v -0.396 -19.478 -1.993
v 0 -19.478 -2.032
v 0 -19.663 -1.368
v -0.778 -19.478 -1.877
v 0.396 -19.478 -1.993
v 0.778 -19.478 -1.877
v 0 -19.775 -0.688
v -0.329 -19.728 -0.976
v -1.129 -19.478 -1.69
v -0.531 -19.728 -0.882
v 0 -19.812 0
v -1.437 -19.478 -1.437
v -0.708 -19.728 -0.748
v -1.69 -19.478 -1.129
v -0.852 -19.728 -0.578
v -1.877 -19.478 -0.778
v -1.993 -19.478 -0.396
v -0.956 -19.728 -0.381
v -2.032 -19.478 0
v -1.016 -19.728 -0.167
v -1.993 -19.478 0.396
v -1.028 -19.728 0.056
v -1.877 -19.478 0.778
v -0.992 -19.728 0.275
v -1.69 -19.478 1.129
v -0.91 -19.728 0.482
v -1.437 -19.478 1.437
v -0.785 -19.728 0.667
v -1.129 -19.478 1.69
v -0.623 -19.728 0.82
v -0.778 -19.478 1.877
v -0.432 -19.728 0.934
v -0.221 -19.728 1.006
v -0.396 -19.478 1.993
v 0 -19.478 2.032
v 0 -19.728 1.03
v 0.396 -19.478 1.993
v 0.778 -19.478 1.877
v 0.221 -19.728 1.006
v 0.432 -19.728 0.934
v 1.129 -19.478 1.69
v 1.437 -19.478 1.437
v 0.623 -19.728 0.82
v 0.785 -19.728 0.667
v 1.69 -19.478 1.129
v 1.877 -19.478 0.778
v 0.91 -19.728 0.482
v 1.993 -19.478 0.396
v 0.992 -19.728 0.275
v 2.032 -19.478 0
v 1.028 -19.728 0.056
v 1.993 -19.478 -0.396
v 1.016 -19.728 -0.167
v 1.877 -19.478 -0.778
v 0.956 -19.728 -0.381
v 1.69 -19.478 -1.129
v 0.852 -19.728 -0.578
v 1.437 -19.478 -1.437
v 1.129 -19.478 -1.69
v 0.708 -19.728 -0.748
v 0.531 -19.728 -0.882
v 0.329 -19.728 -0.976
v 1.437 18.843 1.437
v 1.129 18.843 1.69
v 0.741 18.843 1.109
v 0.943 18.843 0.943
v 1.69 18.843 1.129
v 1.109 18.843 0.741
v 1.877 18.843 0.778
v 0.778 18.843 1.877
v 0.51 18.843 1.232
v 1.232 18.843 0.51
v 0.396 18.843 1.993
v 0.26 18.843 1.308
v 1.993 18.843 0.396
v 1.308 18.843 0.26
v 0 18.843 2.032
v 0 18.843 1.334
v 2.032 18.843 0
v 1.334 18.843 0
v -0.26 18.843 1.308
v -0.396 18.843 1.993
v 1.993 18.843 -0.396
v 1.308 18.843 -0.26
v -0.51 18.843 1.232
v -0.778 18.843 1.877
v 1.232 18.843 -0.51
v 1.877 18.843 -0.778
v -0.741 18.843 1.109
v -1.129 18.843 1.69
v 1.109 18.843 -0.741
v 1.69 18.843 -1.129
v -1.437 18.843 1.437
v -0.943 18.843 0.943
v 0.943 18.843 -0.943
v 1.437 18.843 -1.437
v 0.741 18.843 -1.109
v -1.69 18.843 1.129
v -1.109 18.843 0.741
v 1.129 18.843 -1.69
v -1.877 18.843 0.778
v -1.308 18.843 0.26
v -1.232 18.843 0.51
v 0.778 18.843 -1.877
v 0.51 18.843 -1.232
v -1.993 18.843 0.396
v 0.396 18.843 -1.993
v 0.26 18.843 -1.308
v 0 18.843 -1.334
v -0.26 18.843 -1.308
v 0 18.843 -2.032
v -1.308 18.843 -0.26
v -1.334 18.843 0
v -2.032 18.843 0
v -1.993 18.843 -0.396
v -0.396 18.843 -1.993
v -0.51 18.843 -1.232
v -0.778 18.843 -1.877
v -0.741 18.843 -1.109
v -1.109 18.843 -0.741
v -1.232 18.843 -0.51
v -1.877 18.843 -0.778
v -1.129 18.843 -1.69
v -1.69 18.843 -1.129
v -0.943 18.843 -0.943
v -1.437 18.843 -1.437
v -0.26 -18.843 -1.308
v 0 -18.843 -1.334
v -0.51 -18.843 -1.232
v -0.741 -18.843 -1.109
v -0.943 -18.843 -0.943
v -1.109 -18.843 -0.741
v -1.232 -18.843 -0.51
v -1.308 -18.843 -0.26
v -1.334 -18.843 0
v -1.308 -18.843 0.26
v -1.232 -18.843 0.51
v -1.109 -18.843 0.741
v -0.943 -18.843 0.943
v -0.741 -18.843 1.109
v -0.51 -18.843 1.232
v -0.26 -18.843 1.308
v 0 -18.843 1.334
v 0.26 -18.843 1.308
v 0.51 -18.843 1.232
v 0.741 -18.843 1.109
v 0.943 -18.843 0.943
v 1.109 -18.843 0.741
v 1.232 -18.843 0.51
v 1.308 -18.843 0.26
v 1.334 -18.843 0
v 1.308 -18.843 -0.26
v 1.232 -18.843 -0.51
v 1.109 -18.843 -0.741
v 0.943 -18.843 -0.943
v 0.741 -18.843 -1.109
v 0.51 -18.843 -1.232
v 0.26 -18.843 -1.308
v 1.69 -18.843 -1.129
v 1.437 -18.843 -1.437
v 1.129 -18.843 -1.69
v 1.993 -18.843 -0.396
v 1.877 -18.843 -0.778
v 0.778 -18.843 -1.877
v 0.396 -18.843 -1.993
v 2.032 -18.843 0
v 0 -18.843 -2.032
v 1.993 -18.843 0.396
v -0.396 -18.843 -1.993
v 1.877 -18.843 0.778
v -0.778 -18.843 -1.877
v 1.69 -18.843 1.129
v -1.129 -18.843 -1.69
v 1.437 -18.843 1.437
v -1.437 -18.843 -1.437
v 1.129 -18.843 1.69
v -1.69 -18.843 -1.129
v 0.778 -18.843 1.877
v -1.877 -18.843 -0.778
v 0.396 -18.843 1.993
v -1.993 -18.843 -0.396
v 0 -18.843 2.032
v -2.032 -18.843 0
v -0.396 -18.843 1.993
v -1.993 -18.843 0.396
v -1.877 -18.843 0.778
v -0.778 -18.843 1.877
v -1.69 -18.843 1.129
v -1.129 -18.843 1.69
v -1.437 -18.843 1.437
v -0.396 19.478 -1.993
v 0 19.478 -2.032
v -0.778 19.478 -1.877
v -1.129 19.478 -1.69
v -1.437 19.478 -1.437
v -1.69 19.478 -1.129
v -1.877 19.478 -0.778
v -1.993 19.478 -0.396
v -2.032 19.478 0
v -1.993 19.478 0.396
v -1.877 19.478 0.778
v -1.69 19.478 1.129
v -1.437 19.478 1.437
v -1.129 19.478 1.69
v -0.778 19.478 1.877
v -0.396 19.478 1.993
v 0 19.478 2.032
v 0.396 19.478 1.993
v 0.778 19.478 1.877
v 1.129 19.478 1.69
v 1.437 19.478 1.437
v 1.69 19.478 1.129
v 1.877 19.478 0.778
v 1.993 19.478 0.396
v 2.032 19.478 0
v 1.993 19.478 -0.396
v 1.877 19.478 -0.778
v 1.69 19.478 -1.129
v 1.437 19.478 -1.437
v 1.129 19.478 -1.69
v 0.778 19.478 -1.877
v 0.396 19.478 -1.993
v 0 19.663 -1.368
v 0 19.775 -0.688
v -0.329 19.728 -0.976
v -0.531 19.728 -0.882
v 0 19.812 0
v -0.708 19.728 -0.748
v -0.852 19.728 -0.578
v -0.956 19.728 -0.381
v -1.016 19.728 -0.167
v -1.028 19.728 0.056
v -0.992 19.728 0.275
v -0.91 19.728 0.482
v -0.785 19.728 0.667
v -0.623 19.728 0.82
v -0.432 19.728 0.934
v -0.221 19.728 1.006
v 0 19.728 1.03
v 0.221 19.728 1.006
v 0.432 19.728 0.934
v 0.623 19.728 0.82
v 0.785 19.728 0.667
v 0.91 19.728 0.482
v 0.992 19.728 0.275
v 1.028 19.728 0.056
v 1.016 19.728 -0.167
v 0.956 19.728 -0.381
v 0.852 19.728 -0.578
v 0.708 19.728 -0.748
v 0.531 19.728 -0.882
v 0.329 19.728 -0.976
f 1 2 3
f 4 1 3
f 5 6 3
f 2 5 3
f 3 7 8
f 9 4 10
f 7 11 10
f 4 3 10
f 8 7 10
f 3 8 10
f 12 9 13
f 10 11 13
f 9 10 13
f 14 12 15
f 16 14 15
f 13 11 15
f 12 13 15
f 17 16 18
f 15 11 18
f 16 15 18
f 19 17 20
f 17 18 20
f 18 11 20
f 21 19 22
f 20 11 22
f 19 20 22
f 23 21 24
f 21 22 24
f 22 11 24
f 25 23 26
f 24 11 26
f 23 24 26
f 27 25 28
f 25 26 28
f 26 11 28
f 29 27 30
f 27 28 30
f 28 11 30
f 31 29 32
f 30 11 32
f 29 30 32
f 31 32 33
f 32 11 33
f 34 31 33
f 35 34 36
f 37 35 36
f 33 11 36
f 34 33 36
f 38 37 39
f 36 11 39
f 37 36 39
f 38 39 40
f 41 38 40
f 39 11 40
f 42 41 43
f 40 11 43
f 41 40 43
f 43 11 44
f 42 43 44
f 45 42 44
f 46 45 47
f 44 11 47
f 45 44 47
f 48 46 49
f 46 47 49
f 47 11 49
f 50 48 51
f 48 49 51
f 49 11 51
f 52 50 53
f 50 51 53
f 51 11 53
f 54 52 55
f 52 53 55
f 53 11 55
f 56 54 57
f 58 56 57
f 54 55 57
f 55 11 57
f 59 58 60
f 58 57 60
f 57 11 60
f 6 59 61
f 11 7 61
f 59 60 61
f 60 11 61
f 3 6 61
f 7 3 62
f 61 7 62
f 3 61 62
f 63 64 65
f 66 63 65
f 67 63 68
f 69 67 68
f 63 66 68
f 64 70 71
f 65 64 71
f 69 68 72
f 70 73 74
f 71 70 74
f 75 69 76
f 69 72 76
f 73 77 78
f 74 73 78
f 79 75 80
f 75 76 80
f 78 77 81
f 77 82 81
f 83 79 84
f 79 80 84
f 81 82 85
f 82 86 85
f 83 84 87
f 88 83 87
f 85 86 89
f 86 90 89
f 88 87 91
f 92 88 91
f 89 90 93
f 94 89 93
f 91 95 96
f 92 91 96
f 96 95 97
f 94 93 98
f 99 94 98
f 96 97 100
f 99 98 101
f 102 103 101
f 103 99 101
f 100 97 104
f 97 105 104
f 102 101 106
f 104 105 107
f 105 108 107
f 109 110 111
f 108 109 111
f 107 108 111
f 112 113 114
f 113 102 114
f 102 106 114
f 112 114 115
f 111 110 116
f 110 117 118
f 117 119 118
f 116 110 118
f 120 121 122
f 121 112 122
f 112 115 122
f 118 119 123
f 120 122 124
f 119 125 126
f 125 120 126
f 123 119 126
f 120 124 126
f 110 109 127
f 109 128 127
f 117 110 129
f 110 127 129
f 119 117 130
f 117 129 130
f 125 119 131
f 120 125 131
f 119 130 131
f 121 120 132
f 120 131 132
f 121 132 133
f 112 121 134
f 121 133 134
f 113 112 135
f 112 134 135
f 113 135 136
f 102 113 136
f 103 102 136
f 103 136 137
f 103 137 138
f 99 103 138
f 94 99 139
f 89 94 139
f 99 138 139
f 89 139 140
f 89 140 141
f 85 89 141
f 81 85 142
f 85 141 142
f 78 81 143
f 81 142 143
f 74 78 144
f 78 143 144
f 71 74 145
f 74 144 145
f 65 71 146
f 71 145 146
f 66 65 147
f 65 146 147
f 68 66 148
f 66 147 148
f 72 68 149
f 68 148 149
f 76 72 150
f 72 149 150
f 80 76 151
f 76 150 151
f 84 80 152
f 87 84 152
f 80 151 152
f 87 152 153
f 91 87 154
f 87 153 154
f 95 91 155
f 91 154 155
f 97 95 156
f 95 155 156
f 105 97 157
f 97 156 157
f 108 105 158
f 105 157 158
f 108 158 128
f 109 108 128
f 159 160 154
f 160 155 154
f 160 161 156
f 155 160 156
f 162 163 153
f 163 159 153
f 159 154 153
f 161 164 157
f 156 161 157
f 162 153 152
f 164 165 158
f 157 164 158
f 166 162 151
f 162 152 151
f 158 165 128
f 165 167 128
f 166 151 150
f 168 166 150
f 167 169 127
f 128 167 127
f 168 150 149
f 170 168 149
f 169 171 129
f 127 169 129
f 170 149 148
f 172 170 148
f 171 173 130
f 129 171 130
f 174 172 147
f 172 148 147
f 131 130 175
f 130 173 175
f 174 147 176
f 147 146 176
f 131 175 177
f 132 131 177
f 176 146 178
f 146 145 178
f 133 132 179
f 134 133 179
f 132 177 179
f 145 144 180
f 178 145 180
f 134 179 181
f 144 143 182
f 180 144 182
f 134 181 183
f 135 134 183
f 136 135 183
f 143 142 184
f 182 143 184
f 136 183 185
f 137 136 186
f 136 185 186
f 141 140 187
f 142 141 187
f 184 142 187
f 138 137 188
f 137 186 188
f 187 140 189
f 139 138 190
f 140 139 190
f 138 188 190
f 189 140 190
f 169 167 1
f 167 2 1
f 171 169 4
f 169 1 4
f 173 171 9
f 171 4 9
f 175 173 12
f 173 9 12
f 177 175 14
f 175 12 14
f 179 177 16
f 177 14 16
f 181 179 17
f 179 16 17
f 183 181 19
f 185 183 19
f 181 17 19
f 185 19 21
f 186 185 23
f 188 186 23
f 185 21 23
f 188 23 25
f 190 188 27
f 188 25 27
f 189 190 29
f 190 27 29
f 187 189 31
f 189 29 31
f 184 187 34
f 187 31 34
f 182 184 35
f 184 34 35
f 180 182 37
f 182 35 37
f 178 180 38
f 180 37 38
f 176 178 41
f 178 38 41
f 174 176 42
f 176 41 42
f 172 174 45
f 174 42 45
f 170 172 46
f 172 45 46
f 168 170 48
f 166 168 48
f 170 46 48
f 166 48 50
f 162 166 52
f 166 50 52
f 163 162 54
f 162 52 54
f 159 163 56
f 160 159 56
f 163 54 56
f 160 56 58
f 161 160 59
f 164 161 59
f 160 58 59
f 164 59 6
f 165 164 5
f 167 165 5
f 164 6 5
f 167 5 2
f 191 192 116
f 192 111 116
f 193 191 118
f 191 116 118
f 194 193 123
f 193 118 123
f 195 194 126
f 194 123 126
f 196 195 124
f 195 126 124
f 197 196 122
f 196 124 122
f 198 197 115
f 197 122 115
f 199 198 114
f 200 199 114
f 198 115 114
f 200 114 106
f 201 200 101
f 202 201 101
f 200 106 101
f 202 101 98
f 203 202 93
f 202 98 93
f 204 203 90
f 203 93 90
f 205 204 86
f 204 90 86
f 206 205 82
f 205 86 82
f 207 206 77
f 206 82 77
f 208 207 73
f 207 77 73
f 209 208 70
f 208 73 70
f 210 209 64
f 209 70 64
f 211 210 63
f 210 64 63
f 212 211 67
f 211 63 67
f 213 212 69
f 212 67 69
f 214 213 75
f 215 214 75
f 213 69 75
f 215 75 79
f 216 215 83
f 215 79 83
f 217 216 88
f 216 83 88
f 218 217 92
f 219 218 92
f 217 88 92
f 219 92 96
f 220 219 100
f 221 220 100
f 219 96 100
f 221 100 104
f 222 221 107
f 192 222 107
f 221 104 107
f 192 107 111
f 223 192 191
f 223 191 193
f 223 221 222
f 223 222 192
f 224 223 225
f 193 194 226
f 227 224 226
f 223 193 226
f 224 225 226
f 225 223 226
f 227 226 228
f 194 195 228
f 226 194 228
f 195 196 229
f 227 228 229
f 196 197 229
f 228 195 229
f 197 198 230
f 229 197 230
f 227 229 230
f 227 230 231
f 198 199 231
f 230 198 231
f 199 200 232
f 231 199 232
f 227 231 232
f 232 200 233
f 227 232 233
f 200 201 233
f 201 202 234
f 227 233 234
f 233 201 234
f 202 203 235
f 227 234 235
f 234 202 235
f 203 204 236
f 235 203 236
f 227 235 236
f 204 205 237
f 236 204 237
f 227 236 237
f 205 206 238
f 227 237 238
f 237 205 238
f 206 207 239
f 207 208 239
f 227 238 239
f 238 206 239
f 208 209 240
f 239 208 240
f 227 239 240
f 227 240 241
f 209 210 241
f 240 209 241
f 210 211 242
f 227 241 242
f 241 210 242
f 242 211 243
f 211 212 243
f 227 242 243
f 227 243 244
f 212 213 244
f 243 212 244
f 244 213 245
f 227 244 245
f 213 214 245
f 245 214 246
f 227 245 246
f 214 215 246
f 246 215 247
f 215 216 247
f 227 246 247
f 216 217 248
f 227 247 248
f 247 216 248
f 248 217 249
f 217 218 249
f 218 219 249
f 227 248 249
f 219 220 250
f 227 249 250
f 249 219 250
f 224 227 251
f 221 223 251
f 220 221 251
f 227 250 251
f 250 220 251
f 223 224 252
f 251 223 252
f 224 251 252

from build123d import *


with BuildPart() as part:
    # Sketch1 → Revolve1 (revolve)
    with BuildSketch(Plane.XY, mode=Mode.PRIVATE) as revolve1_sk:
        with BuildLine():
            Line((0, -19.812), (0, 19.812))
            ThreePointArc((0, 19.812), (1.029625208, 19.727969353), (2.032, 19.478101395))
            Line((2.032, 19.478101395), (2.032, 18.843101395))
            Line((2.032, 18.843101395), (1.3335, 18.843101395))
            Line((1.3335, 18.843101395), (1.3335, -18.843101395))
            Line((1.3335, -18.843101395), (2.032, -18.843101395))
            Line((2.032, -18.843101395), (2.032, -19.478101395))
            ThreePointArc((2.032, -19.478101395), (1.029625208, -19.727969353), (0, -19.812))
        make_face()
    revolve(revolve1_sk.sketch.rotate(Axis((0, -19.812, 0), (0, 1, 0)), 90), axis=Axis((0, -19.812, 0), (0, 1, 0)))


solid = part.part
